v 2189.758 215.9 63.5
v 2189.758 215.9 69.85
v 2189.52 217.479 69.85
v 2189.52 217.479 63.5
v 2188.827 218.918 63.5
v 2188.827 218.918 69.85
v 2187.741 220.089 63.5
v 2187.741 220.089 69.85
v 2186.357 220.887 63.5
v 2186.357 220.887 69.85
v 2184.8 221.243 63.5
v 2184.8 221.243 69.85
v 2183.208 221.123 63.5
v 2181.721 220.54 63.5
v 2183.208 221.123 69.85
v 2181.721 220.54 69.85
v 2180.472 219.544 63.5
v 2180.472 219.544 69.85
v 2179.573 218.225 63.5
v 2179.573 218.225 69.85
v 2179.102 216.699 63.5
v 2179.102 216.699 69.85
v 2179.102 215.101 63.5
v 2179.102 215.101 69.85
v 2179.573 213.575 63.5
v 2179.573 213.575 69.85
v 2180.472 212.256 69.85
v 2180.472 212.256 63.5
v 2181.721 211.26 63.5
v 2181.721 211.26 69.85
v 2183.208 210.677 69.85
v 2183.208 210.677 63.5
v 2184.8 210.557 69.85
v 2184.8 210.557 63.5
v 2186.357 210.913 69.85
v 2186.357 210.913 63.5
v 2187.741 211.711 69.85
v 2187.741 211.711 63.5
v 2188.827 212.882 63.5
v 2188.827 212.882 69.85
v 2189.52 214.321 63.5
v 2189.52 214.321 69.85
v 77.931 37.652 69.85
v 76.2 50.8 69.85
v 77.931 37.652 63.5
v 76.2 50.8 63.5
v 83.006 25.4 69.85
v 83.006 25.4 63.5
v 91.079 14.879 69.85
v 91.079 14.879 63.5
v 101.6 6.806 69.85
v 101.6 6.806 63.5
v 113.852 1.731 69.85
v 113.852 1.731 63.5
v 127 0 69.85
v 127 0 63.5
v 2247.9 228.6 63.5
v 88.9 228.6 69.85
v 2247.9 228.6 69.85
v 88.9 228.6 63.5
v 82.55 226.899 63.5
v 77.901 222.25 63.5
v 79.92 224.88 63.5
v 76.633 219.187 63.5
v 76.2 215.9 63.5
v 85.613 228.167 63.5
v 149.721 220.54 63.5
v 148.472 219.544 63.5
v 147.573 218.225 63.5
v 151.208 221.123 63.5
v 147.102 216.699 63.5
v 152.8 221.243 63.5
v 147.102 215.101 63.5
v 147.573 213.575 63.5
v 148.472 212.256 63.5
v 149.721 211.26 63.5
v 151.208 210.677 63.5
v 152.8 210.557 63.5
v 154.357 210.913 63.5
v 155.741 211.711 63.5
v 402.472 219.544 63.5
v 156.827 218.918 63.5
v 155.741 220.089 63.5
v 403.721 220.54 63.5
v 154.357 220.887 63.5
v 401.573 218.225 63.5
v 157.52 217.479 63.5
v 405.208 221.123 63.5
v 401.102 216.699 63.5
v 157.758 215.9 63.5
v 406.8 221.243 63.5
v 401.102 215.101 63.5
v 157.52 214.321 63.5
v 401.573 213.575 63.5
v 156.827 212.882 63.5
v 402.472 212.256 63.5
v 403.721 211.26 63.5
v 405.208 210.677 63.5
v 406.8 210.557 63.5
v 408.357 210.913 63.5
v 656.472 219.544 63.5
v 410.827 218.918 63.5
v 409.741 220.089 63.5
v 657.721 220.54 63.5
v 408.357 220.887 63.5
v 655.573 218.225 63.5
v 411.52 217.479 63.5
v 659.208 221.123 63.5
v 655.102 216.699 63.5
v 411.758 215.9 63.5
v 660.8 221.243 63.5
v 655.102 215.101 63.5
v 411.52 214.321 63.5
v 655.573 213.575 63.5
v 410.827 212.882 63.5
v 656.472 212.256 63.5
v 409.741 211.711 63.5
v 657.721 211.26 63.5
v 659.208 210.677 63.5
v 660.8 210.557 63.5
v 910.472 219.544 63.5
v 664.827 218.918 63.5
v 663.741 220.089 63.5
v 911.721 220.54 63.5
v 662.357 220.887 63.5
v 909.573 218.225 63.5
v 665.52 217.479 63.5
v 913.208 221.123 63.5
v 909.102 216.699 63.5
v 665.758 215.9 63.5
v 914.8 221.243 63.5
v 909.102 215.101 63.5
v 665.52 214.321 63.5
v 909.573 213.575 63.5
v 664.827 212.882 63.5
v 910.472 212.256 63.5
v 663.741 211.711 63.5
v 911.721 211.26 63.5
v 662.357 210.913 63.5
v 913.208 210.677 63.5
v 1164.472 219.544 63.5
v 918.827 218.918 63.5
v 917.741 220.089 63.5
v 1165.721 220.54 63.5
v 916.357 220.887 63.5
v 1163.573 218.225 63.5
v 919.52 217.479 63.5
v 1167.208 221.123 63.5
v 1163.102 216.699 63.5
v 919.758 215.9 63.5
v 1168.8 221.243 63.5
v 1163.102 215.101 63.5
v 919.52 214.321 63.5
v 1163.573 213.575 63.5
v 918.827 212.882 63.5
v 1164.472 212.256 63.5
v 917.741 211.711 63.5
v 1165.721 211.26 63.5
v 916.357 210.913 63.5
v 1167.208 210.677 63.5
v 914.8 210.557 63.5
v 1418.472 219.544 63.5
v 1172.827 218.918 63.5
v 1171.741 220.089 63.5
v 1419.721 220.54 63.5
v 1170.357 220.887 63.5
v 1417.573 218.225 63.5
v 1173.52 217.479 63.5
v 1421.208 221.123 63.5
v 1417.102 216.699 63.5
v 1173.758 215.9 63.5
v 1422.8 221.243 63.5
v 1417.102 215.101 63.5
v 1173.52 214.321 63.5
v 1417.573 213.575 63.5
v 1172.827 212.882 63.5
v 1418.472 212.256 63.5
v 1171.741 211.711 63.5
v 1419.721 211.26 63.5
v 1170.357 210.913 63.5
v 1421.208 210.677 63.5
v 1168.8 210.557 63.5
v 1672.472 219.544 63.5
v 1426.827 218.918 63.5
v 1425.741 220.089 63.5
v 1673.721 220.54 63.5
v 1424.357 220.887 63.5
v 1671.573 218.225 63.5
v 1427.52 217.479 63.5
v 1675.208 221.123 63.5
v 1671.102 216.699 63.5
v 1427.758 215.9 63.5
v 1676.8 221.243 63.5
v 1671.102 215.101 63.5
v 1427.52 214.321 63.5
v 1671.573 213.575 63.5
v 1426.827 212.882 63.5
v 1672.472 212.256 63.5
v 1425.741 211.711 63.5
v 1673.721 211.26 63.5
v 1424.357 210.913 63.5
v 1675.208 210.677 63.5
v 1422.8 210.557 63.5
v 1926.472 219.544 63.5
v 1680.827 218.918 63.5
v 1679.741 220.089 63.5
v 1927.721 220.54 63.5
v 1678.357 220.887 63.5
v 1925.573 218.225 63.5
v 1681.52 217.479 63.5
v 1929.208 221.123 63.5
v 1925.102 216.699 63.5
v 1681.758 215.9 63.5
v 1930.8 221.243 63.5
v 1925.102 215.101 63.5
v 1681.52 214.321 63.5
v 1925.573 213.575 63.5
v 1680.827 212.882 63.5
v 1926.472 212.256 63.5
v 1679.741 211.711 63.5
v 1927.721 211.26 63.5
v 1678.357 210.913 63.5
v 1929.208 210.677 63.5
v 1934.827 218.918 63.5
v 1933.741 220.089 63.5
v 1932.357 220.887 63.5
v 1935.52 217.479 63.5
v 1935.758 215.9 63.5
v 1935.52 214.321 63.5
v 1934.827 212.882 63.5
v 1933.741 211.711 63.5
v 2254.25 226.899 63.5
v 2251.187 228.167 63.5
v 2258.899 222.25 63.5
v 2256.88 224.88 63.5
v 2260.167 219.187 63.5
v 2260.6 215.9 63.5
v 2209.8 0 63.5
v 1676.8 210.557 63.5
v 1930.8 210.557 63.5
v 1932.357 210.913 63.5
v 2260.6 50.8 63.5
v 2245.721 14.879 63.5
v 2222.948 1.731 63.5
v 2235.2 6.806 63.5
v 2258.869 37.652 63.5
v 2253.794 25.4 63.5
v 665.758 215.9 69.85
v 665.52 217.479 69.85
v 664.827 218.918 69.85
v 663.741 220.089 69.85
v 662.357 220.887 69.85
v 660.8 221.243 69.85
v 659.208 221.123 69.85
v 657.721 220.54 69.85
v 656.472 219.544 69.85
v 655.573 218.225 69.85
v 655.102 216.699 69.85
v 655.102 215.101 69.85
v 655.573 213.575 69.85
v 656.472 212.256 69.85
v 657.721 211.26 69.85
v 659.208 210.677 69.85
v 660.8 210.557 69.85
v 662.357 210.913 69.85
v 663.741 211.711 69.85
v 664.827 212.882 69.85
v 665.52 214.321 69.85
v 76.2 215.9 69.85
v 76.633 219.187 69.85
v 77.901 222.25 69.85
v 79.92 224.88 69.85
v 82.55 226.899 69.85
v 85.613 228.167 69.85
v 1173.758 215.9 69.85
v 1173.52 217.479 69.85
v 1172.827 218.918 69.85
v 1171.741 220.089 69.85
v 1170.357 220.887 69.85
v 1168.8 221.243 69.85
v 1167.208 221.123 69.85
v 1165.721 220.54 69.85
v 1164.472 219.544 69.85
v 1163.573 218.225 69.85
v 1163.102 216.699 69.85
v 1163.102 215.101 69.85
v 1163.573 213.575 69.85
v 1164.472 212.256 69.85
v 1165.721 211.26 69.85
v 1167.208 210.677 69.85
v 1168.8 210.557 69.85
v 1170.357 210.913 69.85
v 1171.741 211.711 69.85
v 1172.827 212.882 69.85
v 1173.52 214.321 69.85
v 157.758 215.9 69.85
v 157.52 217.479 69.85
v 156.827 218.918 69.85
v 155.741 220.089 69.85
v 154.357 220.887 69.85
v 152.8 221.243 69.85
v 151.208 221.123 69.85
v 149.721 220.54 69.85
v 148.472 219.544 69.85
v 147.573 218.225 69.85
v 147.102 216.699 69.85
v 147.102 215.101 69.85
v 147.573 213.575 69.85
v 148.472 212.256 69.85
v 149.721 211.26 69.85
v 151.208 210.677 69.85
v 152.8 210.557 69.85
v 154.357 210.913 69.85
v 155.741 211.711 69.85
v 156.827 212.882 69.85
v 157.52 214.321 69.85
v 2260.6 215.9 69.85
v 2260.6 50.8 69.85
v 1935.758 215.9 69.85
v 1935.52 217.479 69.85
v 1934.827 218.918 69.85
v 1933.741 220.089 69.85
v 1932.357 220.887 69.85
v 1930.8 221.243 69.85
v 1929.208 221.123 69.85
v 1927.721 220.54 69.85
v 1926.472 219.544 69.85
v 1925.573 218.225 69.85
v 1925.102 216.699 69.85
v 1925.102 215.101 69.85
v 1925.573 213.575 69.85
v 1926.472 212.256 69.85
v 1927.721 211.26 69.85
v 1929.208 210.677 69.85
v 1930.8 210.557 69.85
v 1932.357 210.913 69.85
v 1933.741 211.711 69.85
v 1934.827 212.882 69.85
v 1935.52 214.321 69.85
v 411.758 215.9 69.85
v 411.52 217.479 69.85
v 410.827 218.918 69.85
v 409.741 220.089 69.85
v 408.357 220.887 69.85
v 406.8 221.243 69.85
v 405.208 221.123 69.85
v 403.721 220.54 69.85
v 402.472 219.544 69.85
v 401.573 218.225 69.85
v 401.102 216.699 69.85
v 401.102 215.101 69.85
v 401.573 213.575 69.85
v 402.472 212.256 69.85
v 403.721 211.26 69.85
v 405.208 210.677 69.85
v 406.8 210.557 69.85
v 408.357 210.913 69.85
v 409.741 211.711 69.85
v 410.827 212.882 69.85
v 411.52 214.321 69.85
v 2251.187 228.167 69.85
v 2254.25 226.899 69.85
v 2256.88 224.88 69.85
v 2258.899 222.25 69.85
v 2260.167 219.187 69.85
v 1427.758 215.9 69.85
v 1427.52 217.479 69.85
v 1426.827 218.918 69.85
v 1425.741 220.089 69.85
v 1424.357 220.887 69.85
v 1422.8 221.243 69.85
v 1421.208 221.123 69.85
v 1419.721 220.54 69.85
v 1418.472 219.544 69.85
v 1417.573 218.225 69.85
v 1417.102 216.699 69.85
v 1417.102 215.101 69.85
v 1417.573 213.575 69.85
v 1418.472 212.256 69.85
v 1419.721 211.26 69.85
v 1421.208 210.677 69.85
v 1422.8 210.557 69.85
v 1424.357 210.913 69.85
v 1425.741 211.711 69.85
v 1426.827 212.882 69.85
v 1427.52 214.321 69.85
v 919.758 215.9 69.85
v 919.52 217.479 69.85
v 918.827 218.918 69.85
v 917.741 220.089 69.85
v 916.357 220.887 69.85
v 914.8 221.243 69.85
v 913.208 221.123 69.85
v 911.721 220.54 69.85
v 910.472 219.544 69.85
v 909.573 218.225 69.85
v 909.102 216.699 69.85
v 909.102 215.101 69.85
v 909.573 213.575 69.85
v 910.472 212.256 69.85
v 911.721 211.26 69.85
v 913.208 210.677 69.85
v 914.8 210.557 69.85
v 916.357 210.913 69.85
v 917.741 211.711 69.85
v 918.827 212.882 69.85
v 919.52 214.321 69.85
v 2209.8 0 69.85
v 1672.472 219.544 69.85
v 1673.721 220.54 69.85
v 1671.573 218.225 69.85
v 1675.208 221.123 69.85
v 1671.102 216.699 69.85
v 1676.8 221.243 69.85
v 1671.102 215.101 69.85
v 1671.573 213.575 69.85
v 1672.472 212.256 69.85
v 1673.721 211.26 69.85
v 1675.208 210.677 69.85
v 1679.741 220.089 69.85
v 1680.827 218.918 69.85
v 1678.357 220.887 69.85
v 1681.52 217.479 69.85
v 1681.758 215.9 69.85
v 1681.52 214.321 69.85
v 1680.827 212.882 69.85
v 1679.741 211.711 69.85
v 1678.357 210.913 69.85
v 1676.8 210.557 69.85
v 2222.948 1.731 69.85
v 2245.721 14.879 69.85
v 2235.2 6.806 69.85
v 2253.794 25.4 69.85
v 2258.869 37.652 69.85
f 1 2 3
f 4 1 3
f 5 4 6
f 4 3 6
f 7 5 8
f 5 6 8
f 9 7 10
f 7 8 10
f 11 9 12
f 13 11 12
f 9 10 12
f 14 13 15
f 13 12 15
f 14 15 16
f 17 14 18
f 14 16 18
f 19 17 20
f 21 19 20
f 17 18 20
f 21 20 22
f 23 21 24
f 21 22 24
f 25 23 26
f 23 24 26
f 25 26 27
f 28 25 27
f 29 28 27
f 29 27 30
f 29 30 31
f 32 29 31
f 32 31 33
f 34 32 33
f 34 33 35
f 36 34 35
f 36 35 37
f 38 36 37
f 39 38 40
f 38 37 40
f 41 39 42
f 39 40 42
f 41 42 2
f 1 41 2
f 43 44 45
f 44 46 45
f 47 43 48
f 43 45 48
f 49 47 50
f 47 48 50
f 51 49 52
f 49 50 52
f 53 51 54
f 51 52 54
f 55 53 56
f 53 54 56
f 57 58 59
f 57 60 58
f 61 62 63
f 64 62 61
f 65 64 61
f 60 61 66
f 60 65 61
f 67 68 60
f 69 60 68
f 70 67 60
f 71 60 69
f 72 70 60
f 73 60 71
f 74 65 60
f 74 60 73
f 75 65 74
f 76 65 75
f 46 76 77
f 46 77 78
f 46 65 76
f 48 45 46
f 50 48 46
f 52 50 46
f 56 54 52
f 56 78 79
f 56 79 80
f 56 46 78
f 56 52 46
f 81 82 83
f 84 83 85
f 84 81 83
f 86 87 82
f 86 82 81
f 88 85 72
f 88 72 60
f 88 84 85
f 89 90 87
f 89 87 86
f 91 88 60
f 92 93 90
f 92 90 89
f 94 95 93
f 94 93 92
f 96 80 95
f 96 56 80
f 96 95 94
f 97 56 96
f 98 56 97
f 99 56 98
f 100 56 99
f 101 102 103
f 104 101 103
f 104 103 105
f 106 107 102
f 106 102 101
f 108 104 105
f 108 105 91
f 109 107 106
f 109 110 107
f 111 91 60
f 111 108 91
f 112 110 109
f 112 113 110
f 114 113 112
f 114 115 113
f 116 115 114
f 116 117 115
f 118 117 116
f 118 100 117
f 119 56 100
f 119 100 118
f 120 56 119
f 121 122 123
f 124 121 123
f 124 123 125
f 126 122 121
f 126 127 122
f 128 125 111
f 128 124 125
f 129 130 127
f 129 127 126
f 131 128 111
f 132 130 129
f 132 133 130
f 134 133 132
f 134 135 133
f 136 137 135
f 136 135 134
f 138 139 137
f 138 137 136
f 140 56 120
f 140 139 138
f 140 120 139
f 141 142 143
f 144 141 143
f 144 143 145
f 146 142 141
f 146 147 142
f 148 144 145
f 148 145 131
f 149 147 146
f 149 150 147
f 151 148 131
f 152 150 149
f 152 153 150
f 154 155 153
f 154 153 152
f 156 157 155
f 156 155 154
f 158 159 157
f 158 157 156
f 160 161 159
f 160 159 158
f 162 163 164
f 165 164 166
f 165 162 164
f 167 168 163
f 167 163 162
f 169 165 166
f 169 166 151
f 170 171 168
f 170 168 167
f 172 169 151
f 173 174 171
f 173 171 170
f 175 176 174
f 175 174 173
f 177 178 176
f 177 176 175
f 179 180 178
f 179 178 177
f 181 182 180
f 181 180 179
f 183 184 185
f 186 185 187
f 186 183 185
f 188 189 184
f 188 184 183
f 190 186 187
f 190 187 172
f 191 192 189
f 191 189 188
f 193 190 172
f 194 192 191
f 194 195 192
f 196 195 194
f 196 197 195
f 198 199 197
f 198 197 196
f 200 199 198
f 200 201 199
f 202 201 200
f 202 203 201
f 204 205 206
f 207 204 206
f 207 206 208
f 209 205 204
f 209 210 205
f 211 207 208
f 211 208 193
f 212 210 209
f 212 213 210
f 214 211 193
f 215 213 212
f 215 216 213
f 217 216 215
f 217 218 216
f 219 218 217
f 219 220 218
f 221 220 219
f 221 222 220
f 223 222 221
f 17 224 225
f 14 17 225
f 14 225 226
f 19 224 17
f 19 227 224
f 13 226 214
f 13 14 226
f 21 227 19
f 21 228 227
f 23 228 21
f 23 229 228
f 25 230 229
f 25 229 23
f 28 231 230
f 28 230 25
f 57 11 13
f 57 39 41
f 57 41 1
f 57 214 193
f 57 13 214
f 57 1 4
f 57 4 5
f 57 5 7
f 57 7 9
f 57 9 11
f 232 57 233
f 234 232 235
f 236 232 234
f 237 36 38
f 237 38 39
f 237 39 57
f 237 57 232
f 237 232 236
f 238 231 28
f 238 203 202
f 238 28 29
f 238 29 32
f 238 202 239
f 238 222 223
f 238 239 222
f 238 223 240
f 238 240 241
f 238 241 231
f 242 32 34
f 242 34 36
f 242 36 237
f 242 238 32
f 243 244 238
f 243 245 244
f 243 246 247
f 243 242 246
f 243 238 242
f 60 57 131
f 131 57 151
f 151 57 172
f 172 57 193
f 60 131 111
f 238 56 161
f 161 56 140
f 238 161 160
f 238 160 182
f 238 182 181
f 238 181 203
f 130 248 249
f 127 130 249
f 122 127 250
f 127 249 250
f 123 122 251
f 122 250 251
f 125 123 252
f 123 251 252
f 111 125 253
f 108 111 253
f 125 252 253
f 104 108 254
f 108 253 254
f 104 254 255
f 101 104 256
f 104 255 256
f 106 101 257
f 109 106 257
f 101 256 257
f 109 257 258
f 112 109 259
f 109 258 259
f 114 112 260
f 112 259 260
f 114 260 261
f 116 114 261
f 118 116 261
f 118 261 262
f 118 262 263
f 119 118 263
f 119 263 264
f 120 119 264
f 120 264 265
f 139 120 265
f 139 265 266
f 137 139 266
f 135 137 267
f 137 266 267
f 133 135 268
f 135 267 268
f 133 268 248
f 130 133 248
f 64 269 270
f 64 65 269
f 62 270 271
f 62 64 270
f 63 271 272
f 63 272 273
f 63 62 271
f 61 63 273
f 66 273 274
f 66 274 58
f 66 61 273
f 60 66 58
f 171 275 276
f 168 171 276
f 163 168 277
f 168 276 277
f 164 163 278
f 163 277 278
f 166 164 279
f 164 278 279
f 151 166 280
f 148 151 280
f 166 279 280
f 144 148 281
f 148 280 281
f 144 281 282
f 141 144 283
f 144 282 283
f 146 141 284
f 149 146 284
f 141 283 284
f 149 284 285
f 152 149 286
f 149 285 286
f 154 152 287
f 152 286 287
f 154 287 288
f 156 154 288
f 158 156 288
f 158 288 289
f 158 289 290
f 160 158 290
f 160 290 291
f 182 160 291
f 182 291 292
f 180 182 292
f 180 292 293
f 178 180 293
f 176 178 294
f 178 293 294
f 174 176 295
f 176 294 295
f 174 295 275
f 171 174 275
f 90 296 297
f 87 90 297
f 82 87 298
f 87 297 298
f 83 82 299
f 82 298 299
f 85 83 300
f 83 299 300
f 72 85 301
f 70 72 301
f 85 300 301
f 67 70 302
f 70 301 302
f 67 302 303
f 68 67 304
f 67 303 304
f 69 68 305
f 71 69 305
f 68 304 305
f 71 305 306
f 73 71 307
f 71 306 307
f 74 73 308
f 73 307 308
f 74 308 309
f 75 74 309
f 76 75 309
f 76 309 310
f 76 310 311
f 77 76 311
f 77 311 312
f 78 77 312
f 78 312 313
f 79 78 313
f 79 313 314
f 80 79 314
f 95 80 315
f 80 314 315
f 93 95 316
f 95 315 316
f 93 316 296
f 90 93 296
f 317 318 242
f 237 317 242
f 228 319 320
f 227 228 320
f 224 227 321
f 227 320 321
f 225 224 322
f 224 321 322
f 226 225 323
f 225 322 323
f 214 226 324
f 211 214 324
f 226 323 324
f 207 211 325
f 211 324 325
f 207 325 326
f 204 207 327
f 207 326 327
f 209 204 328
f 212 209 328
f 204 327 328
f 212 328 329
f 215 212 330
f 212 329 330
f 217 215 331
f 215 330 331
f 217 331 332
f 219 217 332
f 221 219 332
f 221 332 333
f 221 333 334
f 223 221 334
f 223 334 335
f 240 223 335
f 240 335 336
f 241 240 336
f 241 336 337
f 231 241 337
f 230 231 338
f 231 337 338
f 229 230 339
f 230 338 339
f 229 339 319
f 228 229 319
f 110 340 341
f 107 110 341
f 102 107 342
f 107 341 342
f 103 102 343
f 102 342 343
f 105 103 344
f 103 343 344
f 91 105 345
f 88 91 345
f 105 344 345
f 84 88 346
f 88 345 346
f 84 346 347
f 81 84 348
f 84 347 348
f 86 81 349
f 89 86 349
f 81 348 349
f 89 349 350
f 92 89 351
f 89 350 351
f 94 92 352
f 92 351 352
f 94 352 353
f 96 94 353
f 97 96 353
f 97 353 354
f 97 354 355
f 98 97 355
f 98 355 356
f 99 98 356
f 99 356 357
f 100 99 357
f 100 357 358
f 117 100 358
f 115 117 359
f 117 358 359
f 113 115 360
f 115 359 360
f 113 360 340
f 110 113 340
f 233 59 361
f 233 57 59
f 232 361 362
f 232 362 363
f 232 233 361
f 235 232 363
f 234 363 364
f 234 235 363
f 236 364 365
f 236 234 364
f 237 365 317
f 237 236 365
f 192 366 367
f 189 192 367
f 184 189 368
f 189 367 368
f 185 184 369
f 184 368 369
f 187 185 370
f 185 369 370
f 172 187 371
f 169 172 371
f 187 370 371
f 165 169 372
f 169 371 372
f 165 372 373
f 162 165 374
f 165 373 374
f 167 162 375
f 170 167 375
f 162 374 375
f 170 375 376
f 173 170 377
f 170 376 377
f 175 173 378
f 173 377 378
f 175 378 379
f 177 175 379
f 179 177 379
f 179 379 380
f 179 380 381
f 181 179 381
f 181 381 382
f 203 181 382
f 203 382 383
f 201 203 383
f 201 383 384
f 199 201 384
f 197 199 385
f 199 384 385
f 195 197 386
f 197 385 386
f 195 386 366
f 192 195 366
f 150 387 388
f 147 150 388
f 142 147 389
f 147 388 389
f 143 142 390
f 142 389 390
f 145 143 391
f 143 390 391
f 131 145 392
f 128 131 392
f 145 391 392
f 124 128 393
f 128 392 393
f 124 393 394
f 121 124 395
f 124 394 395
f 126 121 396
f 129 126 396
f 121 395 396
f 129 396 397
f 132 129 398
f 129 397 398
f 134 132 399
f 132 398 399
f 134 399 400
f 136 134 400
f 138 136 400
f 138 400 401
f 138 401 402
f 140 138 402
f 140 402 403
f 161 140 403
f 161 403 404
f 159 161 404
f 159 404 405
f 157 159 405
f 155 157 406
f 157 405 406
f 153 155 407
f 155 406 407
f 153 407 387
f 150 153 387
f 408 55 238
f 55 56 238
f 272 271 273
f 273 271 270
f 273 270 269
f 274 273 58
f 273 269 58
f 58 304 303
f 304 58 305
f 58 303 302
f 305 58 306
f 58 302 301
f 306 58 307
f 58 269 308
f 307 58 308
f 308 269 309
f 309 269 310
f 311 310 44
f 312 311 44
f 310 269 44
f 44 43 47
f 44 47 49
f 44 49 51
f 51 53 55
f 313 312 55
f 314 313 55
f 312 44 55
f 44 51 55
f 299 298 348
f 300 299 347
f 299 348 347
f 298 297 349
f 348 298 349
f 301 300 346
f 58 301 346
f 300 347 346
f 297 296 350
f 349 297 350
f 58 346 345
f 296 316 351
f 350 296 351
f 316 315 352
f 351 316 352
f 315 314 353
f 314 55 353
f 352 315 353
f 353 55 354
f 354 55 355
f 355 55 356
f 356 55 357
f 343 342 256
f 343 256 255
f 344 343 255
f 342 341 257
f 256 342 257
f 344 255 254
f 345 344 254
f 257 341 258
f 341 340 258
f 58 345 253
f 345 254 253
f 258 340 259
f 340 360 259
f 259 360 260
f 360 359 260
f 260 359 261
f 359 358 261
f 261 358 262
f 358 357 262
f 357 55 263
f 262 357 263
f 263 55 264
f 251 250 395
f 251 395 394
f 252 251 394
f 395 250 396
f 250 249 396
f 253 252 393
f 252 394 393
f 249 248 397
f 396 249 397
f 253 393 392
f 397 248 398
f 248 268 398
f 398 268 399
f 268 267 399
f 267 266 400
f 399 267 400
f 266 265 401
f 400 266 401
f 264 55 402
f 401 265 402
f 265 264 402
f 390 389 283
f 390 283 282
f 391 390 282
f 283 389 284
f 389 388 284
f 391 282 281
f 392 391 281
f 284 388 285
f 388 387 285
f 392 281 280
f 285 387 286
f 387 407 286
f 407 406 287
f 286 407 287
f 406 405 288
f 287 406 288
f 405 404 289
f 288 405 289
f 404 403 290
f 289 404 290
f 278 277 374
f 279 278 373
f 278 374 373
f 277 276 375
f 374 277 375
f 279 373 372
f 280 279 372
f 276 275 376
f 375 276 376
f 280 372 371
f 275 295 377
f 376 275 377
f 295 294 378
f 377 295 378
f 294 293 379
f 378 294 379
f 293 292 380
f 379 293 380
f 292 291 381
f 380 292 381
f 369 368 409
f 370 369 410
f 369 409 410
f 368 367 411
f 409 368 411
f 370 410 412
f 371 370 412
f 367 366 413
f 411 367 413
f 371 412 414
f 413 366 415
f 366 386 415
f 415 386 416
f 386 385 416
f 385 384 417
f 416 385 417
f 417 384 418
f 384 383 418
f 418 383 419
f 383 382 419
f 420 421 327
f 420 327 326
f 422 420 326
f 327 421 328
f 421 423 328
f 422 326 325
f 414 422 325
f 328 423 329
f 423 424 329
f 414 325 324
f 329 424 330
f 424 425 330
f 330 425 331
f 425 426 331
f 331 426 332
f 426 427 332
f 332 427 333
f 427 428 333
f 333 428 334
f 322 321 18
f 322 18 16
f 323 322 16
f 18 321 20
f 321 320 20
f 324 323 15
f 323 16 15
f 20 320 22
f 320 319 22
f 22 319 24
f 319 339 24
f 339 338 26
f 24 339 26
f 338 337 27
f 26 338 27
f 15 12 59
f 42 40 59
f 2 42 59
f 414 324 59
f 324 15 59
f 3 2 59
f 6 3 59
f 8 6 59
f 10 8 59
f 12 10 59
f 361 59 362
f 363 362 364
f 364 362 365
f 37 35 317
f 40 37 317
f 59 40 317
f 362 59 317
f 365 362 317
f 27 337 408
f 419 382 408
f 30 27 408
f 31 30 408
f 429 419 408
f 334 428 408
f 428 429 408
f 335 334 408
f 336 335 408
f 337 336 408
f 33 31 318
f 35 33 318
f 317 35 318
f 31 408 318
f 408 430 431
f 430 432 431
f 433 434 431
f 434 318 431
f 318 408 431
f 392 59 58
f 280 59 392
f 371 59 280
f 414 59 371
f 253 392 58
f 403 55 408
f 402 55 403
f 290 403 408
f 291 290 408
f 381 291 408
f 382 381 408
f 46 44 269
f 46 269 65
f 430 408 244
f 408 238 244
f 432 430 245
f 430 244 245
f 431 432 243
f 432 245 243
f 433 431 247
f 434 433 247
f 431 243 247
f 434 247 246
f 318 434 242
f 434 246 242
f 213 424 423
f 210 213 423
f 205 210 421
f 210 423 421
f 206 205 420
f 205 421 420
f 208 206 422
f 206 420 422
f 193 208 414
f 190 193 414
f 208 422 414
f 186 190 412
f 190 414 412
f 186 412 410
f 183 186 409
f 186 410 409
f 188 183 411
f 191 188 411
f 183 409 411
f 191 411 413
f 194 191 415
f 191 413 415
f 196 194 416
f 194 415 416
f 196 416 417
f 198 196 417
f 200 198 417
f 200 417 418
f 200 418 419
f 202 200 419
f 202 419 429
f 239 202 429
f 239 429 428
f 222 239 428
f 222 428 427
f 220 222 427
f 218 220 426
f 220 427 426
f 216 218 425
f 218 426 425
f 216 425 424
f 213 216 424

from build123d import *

# Parameters (mm, degrees)
SKETCH1_W          = 2184.4
SKETCH1_H          = 6.35
BASE_FLANGE1_DEPTH = 228.6
SKETCH2_R          = 5.3578125
CUT_EXTRUDE1_DEPTH = 6.35
FILLET1_R          = 50.8
FILLET2_R          = 12.7


# Sheet-metal steps are written as plain solids
with BuildPart() as part:
    # Sketch1 → Base-Flange1 (new body)
    with BuildSketch(Plane(origin=(0, 0, 0), x_dir=(1, 0, 0), z_dir=(0, 1, 0))):
        with Locations((1168.4, -66.675)):
            Rectangle(SKETCH1_W, SKETCH1_H)
    extrude(amount=BASE_FLANGE1_DEPTH)

    # Sketch2 → Cut-Extrude1 (cut)
    with BuildSketch(Plane.XY.offset(69.85)):
        with Locations((152.4, 215.9)):
            Circle(SKETCH2_R)
        with Locations((406.4, 215.9)):
            Circle(SKETCH2_R)
        with Locations((660.4, 215.9)):
            Circle(SKETCH2_R)
        with Locations((914.4, 215.9)):
            Circle(SKETCH2_R)
        with Locations((1168.4, 215.9)):
            Circle(SKETCH2_R)
        with Locations((1422.4, 215.9)):
            Circle(SKETCH2_R)
        with Locations((1676.4, 215.9)):
            Circle(SKETCH2_R)
        with Locations((1930.4, 215.9)):
            Circle(SKETCH2_R)
        with Locations((2184.4, 215.9)):
            Circle(SKETCH2_R)
    extrude(amount=-CUT_EXTRUDE1_DEPTH, mode=Mode.SUBTRACT)

    # Fillet1
    fillet1_edges = [part.edges().sort_by_distance(p)[0] for p in [
        (2260.6, 0, 66.675),
        (76.2, 0, 66.675),
    ]]
    fillet(fillet1_edges, radius=FILLET1_R)

    # Fillet2
    fillet2_edges = [part.edges().sort_by_distance(p)[0] for p in [
        (2260.6, 228.6, 66.675),
        (76.2, 228.6, 66.675),
    ]]
    fillet(fillet2_edges, radius=FILLET2_R)


solid = part.part
